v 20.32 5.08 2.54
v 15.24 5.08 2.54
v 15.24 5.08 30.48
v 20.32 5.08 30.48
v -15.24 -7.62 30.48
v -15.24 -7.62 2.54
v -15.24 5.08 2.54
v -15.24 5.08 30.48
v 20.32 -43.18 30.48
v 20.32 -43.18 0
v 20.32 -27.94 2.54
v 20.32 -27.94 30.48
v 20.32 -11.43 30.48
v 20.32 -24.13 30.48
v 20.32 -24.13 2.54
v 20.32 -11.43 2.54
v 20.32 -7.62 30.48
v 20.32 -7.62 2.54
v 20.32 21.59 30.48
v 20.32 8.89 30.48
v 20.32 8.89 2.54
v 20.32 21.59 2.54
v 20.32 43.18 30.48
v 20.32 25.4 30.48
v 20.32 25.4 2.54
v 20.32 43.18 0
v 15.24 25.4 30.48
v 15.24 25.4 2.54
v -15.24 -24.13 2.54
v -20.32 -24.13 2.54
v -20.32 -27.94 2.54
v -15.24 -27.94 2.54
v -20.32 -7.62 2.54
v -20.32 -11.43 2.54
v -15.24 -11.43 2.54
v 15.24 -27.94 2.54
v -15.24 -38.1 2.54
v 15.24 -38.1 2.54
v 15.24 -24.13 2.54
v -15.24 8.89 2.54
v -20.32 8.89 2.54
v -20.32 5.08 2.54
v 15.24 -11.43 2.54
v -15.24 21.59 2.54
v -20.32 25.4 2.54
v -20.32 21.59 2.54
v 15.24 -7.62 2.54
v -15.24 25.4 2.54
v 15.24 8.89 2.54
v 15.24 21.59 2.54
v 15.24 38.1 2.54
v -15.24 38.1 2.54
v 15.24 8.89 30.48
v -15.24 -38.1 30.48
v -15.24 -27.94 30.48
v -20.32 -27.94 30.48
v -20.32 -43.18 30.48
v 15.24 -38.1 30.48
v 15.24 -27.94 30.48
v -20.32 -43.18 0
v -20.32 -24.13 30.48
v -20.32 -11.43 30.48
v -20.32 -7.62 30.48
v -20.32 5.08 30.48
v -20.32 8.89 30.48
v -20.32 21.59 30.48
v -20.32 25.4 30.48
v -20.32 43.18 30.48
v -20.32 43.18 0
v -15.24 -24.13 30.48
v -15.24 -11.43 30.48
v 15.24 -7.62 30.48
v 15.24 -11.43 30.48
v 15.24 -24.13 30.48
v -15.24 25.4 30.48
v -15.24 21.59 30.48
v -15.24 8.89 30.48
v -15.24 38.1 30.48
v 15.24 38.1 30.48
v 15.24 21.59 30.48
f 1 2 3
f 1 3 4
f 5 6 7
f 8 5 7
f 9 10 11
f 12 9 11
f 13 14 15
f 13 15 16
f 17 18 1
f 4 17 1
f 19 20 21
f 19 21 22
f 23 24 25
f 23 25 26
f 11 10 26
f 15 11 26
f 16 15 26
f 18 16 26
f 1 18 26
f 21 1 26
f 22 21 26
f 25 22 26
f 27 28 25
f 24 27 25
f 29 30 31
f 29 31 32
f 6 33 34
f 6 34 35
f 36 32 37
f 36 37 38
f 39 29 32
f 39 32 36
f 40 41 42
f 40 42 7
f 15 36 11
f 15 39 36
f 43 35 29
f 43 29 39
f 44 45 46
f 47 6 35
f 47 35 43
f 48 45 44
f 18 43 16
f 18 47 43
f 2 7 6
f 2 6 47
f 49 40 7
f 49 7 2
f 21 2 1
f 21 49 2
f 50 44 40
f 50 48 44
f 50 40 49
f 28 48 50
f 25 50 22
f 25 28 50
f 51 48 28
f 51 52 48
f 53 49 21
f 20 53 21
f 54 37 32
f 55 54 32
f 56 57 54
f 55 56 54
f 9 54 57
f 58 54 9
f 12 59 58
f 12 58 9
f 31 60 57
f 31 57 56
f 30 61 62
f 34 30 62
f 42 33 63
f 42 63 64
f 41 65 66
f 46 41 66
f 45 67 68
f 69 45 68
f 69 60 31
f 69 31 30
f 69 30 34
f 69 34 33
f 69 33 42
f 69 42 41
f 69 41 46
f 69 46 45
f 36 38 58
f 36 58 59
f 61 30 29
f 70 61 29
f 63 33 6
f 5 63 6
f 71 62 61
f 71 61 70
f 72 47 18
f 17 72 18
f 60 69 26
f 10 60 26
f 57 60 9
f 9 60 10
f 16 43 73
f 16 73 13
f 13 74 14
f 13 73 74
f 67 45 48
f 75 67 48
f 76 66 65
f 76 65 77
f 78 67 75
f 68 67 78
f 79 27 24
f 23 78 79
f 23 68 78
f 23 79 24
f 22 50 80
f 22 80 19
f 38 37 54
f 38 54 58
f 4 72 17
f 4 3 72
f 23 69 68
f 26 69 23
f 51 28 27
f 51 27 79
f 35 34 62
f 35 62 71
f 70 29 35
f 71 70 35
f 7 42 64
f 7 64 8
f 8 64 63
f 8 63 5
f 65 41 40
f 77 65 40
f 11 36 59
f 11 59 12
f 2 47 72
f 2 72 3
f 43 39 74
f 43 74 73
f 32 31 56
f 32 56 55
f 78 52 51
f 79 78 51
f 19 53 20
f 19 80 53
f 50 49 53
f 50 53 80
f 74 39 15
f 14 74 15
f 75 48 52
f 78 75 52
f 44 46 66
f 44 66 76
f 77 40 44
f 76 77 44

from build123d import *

# Parameters (mm, degrees)
F0_W     = 40.64
F0_H     = 86.36
F0_W_2   = 30.48
F0_H_2   = 76.2
F1_DEPTH = 30.48
F2_DEPTH = 2.54
F3_W     = 5.08
F3_H     = 3.81
F4_DEPTH = 27.94


# Not quite as in the source:
# - a feature names something its author has since deleted; it is built from what else it names


with BuildPart() as f1:
    # F0 (on Top) → F1 (new body)
    with BuildSketch(Plane.XY):
        Rectangle(F0_W, F0_H)
        Rectangle(F0_W_2, F0_H_2, mode=Mode.SUBTRACT)
    extrude(amount=F1_DEPTH)

    # F0 (on Top) → F2 (join)
    with BuildSketch(Plane.XY):
        Rectangle(F0_W_2, F0_H_2)
    extrude(amount=F2_DEPTH)

    # F3 (on face) → F4 (cut)
    with BuildSketch(Plane.XY.offset(30.48)):
        with Locations((-17.78, 23.495)):
            Rectangle(F3_W, F3_H)
        with Locations((17.78, 23.495)):
            Rectangle(F3_W, F3_H)
        with Locations((17.78, 6.985)):
            Rectangle(F3_W, F3_H)
        with Locations((-17.78, 6.985)):
            Rectangle(F3_W, F3_H)
        with Locations((-17.78, -9.525)):
            Rectangle(F3_W, F3_H)
        with Locations((17.78, -9.525)):
            Rectangle(F3_W, F3_H)
        with Locations((-17.78, -26.035)):
            Rectangle(F3_W, F3_H)
        with Locations((17.78, -26.035)):
            Rectangle(F3_W, F3_H)
    extrude(amount=-F4_DEPTH, mode=Mode.SUBTRACT)


solid = f1.part
